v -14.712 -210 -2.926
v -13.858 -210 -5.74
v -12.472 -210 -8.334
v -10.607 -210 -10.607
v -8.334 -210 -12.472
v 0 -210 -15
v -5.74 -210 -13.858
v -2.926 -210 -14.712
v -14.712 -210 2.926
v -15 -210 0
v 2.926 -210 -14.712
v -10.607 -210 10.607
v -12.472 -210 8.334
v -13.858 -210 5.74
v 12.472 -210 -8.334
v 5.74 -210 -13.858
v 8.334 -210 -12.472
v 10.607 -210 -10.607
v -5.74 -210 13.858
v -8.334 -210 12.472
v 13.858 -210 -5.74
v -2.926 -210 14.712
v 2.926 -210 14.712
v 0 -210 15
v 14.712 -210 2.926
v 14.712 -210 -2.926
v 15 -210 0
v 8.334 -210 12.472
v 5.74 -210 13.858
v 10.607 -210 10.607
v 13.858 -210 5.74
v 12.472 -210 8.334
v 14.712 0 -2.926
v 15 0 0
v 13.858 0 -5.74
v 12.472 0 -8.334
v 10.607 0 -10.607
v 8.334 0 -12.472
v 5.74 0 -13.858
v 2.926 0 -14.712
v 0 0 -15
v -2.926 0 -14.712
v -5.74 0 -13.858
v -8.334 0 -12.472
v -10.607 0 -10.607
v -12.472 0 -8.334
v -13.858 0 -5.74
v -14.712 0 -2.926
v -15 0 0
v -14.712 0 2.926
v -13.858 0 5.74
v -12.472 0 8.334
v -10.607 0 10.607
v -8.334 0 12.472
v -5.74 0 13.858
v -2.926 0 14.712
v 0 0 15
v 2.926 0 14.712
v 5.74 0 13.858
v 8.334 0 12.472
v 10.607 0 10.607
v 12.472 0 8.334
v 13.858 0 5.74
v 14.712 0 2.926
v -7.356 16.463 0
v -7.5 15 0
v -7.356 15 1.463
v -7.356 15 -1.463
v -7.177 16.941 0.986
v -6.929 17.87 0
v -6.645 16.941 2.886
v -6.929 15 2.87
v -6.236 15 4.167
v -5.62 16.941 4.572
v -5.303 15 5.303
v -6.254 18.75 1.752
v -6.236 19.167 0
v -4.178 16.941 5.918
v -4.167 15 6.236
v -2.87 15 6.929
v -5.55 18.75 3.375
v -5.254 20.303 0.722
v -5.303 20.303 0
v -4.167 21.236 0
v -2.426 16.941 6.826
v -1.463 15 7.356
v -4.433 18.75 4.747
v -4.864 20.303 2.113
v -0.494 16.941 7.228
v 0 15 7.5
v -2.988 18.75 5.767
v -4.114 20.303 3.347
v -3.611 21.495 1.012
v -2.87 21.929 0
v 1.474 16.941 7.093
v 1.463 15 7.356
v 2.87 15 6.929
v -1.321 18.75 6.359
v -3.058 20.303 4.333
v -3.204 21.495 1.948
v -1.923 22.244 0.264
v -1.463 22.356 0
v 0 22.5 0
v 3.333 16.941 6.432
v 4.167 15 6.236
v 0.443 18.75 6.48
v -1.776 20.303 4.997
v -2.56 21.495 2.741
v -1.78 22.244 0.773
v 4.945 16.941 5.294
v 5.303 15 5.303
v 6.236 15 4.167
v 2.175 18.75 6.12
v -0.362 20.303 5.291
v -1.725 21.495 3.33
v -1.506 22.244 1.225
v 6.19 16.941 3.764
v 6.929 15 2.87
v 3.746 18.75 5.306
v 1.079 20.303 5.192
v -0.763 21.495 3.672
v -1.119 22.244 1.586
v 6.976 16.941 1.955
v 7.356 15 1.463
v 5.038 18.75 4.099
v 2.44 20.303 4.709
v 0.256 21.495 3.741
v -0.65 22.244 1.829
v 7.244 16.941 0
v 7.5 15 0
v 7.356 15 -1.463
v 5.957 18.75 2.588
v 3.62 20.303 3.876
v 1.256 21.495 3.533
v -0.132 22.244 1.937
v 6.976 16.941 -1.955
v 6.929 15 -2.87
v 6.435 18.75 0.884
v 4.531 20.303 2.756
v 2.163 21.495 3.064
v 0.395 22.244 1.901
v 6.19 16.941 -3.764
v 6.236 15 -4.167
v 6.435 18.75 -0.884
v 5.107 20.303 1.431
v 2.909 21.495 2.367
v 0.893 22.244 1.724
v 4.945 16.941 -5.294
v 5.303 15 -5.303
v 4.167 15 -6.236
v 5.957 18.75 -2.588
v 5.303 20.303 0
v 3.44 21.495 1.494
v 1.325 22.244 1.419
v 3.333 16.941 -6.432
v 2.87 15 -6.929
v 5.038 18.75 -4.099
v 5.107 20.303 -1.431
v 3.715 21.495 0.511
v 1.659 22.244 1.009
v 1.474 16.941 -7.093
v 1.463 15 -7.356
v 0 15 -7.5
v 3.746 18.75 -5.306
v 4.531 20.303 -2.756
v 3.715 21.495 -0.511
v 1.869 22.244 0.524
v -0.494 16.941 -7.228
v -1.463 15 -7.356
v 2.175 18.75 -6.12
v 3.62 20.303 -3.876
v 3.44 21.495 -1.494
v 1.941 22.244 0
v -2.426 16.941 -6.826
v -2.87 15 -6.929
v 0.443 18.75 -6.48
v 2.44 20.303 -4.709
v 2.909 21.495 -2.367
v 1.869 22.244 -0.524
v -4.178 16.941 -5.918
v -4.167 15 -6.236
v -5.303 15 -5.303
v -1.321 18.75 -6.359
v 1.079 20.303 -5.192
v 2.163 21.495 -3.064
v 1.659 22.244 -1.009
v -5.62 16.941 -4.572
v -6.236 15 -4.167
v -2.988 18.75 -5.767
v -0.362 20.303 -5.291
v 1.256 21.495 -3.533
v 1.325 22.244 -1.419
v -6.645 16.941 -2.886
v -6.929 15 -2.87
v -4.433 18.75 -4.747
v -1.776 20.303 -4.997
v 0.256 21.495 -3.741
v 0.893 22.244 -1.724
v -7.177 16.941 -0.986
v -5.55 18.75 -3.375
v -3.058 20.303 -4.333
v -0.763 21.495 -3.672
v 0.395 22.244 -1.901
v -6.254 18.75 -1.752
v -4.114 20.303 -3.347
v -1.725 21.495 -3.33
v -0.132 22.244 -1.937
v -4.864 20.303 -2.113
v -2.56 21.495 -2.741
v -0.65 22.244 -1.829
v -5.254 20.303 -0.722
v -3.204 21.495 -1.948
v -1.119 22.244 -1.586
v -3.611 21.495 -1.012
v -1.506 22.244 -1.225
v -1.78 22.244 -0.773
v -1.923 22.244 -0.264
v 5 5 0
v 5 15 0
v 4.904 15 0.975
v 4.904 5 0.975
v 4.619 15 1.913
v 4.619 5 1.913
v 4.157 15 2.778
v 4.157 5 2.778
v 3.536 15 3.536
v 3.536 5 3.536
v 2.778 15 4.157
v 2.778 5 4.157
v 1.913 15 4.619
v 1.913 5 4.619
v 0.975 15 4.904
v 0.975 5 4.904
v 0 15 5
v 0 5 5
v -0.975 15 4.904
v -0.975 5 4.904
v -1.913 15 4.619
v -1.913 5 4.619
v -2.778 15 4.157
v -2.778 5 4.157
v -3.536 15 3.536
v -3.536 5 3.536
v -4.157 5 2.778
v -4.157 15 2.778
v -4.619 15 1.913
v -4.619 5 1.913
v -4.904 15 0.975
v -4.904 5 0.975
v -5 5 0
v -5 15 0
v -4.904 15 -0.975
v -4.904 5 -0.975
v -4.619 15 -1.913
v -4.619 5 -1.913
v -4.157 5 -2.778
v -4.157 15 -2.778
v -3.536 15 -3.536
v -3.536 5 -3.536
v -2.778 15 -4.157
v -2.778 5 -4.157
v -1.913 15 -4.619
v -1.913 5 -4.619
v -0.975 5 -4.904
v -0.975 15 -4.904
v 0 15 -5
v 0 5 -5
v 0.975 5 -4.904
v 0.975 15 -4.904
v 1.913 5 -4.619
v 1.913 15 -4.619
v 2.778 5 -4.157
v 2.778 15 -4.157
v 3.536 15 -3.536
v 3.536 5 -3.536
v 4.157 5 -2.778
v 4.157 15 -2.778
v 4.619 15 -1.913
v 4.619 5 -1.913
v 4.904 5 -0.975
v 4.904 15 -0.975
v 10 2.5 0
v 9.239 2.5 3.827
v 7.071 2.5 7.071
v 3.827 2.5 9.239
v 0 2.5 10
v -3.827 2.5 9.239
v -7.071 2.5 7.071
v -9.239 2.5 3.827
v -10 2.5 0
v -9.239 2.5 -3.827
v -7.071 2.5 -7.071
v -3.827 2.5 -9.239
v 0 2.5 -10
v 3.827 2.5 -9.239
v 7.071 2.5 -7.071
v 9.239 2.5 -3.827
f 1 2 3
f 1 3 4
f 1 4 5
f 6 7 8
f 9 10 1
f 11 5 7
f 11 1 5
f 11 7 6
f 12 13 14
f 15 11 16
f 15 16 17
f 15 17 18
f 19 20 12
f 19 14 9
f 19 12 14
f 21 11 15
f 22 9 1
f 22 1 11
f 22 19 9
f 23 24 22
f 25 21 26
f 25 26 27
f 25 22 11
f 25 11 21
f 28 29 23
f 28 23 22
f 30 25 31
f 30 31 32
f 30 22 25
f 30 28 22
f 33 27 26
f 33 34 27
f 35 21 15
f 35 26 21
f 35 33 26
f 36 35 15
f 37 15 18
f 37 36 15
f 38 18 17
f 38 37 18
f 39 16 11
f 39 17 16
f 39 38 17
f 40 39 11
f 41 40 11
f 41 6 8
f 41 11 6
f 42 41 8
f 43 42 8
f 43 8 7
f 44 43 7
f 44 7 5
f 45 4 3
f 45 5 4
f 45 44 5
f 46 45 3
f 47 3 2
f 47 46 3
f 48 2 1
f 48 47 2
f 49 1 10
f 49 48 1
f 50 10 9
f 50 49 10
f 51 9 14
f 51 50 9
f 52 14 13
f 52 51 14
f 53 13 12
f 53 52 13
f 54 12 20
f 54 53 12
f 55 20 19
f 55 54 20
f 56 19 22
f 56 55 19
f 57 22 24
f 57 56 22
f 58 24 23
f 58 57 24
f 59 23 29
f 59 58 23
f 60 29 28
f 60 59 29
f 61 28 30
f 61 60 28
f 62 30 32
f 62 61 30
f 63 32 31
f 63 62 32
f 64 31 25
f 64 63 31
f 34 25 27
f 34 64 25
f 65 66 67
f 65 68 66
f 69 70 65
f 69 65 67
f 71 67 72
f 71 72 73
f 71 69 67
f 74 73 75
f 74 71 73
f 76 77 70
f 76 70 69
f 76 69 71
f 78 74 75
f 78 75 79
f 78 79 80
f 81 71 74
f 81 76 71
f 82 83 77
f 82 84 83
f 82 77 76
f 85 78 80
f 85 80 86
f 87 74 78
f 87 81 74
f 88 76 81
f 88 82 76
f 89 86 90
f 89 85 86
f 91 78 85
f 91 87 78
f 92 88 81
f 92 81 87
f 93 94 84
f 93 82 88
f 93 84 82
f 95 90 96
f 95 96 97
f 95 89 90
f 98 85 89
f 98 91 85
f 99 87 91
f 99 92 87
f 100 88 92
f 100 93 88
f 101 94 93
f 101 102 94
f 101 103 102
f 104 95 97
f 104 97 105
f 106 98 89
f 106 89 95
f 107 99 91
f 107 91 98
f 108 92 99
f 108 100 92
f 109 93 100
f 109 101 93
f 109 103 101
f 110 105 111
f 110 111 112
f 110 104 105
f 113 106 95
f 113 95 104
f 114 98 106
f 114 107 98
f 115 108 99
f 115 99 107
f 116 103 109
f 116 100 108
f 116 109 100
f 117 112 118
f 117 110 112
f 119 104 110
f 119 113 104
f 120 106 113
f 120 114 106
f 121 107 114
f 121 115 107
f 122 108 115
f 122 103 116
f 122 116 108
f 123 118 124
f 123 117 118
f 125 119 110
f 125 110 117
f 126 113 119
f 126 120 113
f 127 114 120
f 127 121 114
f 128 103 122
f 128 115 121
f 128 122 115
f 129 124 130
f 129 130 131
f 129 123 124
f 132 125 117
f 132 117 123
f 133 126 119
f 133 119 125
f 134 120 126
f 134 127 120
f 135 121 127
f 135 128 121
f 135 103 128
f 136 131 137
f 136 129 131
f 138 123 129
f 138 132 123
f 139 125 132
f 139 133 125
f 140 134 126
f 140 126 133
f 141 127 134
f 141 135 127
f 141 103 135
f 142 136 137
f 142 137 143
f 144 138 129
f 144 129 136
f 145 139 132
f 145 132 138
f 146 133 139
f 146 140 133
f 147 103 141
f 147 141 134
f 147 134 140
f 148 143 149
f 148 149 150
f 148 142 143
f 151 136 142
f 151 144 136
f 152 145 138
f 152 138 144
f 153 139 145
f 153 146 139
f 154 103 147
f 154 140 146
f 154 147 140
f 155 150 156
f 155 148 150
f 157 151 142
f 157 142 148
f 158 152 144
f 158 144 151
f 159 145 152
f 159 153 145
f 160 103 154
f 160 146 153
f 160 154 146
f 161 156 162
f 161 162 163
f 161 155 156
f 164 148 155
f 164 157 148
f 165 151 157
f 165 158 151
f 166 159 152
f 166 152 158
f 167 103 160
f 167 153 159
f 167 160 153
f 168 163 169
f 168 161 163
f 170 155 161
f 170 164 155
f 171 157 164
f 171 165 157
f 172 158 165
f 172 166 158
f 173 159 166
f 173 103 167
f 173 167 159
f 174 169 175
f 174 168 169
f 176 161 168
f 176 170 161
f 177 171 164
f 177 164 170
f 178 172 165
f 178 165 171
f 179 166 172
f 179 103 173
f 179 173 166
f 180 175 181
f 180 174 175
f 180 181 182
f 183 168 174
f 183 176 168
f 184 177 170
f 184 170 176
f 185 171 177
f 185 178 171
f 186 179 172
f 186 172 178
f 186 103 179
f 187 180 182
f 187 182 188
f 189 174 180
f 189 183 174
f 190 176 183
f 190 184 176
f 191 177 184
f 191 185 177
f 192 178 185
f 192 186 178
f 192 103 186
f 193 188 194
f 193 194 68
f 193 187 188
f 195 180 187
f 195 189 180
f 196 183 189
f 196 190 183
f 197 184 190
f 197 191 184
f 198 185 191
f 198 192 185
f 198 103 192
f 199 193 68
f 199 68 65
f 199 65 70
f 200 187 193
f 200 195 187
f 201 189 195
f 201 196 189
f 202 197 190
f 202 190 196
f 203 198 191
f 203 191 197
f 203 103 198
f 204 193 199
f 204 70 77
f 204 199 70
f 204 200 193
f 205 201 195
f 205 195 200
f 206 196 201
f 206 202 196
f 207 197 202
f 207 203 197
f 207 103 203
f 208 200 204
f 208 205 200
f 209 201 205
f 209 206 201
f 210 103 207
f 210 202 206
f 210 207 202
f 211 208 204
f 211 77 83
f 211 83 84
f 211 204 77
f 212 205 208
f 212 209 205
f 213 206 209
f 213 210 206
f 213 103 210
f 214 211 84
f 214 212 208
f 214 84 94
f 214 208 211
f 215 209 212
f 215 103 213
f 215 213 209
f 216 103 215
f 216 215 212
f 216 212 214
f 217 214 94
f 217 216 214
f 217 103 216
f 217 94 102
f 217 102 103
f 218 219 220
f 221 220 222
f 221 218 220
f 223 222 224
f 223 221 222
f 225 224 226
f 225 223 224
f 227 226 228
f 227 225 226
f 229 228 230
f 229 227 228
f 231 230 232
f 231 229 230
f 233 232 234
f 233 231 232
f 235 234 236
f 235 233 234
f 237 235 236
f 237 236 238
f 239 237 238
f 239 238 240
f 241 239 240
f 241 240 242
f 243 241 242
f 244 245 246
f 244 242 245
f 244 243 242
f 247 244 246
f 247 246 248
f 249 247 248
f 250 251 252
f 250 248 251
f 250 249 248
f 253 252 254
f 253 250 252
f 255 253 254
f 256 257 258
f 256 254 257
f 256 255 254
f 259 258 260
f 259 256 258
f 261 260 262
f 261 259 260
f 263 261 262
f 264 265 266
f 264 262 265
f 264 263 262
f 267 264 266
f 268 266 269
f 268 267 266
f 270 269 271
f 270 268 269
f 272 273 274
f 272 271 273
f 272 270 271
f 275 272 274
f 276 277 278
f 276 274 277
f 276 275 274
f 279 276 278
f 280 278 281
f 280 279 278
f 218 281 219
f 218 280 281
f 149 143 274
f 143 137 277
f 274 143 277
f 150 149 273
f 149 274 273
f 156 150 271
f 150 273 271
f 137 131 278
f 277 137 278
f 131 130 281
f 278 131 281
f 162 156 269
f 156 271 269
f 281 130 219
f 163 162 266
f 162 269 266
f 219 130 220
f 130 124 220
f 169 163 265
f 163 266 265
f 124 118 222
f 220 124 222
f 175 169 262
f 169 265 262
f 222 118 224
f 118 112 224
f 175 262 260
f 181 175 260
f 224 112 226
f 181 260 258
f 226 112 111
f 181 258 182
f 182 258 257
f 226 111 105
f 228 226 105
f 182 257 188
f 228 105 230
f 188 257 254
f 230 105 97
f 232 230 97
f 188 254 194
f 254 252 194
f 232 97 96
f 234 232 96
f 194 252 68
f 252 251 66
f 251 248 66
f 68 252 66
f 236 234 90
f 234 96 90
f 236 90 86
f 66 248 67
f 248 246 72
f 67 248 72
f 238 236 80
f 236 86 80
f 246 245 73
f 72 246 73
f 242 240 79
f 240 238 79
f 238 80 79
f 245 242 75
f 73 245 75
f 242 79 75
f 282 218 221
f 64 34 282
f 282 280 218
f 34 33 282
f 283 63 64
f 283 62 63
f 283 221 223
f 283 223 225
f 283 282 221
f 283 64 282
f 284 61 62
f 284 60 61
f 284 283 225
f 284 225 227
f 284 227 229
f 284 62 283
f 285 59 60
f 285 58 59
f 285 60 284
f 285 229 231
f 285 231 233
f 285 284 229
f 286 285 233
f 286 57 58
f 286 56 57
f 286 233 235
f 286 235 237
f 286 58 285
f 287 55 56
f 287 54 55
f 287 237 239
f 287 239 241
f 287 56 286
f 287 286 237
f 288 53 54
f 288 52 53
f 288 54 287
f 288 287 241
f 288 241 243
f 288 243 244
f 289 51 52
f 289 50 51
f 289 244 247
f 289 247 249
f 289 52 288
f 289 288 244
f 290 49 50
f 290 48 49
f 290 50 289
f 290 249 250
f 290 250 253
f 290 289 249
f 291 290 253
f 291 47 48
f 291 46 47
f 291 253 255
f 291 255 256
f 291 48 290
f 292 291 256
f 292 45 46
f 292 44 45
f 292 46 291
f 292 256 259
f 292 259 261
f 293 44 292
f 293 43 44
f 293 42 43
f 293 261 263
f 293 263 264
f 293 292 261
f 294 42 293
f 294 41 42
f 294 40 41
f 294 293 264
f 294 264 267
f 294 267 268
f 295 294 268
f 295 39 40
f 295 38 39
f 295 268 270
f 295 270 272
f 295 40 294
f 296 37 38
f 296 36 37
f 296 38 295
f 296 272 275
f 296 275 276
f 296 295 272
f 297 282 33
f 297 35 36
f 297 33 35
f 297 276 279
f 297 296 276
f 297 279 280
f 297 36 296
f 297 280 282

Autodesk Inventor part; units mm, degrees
ref_plane "YZ Plane" through (0, 0, 0) normal (1, 0, 0) x (0, 1, 0)
ref_plane "XZ Plane" through (0, 0, 0) normal (0, 1, 0) x (-1, 0, 0)
ref_plane "XY Plane" through (0, 0, 0) normal (0, 0, 1) x (1, 0, 0)
sketch "Sketch4" plane through (0, 0, 0) normal (0, 0, 1) x (1, 0, 0)
  line L0 (0, 0) -> (15, 0)
  line L1 (15, 0) -> (0, 7.5)
  line L2 (0, 7.5) -> (0, 0)
  line L3 (0, 5) -> (5, 5)
  dimension "d4" = 15
  dimension "d5" = 7.5
  dimension "d6" = 2.5
revolve "Revolution1" add sketch "Sketch4" angle 360 about axis through (0, 7.5, 0) along (0, -1, 0) contours L2 L3 L1 L0
sketch "Sketch5" plane through (0, 0, 0) normal (0, -1, 0) x (1, 0, 0)
  circle A0 centre (0, 0) radius 15
  point P0 (0, 0)
  dimension "d17" = 30
extrude "Extrusion2" add sketch "Sketch5" along normal blind 210
sketch "Sketch7" plane through (0, 5, 0) normal (0, 1, 0) x (1, 0, 0)
  circle A0 centre (0, 0) radius 5
  point P0 (0, 0)
  dimension "d18" = 10
extrude "Extrusion4" add sketch "Sketch7" along normal blind 10
sketch "Sketch8" plane through (0, 15, 0) normal (0, 1, 0) x (1, 0, 0)
  circle A0 centre (0, 0) radius 7.5
  line L0 (0, -7.5) -> (0, 7.5)
  point P0 (0, 0)
  dimension "d19" = 15
ref_plane "Work Plane1" through (0, 15, 0) normal (0, 0, -1) x (-1, 0, 0)
sketch "Sketch9" plane through (0, 15, 0) normal (0, 0, -1) x (-1, 0, 0)
  line L0 (0, 0) -> (7.5, 0)
  line L1 (0, 0) -> (0, 7.5)
  circle A0 centre (0, 0) radius 7.5
  line L2 (0, 0) -> (-7.5, 0)
  point P0 (0, -15)
  dimension "d20" = 7.5
  dimension "d21" = 7.5
revolve "Revolution2" add sketch "Sketch9" angle 360 about axis through (0, 15, 0) along (0, 1, 0) contours L1 A0 L0
properties part number "Shafts"
